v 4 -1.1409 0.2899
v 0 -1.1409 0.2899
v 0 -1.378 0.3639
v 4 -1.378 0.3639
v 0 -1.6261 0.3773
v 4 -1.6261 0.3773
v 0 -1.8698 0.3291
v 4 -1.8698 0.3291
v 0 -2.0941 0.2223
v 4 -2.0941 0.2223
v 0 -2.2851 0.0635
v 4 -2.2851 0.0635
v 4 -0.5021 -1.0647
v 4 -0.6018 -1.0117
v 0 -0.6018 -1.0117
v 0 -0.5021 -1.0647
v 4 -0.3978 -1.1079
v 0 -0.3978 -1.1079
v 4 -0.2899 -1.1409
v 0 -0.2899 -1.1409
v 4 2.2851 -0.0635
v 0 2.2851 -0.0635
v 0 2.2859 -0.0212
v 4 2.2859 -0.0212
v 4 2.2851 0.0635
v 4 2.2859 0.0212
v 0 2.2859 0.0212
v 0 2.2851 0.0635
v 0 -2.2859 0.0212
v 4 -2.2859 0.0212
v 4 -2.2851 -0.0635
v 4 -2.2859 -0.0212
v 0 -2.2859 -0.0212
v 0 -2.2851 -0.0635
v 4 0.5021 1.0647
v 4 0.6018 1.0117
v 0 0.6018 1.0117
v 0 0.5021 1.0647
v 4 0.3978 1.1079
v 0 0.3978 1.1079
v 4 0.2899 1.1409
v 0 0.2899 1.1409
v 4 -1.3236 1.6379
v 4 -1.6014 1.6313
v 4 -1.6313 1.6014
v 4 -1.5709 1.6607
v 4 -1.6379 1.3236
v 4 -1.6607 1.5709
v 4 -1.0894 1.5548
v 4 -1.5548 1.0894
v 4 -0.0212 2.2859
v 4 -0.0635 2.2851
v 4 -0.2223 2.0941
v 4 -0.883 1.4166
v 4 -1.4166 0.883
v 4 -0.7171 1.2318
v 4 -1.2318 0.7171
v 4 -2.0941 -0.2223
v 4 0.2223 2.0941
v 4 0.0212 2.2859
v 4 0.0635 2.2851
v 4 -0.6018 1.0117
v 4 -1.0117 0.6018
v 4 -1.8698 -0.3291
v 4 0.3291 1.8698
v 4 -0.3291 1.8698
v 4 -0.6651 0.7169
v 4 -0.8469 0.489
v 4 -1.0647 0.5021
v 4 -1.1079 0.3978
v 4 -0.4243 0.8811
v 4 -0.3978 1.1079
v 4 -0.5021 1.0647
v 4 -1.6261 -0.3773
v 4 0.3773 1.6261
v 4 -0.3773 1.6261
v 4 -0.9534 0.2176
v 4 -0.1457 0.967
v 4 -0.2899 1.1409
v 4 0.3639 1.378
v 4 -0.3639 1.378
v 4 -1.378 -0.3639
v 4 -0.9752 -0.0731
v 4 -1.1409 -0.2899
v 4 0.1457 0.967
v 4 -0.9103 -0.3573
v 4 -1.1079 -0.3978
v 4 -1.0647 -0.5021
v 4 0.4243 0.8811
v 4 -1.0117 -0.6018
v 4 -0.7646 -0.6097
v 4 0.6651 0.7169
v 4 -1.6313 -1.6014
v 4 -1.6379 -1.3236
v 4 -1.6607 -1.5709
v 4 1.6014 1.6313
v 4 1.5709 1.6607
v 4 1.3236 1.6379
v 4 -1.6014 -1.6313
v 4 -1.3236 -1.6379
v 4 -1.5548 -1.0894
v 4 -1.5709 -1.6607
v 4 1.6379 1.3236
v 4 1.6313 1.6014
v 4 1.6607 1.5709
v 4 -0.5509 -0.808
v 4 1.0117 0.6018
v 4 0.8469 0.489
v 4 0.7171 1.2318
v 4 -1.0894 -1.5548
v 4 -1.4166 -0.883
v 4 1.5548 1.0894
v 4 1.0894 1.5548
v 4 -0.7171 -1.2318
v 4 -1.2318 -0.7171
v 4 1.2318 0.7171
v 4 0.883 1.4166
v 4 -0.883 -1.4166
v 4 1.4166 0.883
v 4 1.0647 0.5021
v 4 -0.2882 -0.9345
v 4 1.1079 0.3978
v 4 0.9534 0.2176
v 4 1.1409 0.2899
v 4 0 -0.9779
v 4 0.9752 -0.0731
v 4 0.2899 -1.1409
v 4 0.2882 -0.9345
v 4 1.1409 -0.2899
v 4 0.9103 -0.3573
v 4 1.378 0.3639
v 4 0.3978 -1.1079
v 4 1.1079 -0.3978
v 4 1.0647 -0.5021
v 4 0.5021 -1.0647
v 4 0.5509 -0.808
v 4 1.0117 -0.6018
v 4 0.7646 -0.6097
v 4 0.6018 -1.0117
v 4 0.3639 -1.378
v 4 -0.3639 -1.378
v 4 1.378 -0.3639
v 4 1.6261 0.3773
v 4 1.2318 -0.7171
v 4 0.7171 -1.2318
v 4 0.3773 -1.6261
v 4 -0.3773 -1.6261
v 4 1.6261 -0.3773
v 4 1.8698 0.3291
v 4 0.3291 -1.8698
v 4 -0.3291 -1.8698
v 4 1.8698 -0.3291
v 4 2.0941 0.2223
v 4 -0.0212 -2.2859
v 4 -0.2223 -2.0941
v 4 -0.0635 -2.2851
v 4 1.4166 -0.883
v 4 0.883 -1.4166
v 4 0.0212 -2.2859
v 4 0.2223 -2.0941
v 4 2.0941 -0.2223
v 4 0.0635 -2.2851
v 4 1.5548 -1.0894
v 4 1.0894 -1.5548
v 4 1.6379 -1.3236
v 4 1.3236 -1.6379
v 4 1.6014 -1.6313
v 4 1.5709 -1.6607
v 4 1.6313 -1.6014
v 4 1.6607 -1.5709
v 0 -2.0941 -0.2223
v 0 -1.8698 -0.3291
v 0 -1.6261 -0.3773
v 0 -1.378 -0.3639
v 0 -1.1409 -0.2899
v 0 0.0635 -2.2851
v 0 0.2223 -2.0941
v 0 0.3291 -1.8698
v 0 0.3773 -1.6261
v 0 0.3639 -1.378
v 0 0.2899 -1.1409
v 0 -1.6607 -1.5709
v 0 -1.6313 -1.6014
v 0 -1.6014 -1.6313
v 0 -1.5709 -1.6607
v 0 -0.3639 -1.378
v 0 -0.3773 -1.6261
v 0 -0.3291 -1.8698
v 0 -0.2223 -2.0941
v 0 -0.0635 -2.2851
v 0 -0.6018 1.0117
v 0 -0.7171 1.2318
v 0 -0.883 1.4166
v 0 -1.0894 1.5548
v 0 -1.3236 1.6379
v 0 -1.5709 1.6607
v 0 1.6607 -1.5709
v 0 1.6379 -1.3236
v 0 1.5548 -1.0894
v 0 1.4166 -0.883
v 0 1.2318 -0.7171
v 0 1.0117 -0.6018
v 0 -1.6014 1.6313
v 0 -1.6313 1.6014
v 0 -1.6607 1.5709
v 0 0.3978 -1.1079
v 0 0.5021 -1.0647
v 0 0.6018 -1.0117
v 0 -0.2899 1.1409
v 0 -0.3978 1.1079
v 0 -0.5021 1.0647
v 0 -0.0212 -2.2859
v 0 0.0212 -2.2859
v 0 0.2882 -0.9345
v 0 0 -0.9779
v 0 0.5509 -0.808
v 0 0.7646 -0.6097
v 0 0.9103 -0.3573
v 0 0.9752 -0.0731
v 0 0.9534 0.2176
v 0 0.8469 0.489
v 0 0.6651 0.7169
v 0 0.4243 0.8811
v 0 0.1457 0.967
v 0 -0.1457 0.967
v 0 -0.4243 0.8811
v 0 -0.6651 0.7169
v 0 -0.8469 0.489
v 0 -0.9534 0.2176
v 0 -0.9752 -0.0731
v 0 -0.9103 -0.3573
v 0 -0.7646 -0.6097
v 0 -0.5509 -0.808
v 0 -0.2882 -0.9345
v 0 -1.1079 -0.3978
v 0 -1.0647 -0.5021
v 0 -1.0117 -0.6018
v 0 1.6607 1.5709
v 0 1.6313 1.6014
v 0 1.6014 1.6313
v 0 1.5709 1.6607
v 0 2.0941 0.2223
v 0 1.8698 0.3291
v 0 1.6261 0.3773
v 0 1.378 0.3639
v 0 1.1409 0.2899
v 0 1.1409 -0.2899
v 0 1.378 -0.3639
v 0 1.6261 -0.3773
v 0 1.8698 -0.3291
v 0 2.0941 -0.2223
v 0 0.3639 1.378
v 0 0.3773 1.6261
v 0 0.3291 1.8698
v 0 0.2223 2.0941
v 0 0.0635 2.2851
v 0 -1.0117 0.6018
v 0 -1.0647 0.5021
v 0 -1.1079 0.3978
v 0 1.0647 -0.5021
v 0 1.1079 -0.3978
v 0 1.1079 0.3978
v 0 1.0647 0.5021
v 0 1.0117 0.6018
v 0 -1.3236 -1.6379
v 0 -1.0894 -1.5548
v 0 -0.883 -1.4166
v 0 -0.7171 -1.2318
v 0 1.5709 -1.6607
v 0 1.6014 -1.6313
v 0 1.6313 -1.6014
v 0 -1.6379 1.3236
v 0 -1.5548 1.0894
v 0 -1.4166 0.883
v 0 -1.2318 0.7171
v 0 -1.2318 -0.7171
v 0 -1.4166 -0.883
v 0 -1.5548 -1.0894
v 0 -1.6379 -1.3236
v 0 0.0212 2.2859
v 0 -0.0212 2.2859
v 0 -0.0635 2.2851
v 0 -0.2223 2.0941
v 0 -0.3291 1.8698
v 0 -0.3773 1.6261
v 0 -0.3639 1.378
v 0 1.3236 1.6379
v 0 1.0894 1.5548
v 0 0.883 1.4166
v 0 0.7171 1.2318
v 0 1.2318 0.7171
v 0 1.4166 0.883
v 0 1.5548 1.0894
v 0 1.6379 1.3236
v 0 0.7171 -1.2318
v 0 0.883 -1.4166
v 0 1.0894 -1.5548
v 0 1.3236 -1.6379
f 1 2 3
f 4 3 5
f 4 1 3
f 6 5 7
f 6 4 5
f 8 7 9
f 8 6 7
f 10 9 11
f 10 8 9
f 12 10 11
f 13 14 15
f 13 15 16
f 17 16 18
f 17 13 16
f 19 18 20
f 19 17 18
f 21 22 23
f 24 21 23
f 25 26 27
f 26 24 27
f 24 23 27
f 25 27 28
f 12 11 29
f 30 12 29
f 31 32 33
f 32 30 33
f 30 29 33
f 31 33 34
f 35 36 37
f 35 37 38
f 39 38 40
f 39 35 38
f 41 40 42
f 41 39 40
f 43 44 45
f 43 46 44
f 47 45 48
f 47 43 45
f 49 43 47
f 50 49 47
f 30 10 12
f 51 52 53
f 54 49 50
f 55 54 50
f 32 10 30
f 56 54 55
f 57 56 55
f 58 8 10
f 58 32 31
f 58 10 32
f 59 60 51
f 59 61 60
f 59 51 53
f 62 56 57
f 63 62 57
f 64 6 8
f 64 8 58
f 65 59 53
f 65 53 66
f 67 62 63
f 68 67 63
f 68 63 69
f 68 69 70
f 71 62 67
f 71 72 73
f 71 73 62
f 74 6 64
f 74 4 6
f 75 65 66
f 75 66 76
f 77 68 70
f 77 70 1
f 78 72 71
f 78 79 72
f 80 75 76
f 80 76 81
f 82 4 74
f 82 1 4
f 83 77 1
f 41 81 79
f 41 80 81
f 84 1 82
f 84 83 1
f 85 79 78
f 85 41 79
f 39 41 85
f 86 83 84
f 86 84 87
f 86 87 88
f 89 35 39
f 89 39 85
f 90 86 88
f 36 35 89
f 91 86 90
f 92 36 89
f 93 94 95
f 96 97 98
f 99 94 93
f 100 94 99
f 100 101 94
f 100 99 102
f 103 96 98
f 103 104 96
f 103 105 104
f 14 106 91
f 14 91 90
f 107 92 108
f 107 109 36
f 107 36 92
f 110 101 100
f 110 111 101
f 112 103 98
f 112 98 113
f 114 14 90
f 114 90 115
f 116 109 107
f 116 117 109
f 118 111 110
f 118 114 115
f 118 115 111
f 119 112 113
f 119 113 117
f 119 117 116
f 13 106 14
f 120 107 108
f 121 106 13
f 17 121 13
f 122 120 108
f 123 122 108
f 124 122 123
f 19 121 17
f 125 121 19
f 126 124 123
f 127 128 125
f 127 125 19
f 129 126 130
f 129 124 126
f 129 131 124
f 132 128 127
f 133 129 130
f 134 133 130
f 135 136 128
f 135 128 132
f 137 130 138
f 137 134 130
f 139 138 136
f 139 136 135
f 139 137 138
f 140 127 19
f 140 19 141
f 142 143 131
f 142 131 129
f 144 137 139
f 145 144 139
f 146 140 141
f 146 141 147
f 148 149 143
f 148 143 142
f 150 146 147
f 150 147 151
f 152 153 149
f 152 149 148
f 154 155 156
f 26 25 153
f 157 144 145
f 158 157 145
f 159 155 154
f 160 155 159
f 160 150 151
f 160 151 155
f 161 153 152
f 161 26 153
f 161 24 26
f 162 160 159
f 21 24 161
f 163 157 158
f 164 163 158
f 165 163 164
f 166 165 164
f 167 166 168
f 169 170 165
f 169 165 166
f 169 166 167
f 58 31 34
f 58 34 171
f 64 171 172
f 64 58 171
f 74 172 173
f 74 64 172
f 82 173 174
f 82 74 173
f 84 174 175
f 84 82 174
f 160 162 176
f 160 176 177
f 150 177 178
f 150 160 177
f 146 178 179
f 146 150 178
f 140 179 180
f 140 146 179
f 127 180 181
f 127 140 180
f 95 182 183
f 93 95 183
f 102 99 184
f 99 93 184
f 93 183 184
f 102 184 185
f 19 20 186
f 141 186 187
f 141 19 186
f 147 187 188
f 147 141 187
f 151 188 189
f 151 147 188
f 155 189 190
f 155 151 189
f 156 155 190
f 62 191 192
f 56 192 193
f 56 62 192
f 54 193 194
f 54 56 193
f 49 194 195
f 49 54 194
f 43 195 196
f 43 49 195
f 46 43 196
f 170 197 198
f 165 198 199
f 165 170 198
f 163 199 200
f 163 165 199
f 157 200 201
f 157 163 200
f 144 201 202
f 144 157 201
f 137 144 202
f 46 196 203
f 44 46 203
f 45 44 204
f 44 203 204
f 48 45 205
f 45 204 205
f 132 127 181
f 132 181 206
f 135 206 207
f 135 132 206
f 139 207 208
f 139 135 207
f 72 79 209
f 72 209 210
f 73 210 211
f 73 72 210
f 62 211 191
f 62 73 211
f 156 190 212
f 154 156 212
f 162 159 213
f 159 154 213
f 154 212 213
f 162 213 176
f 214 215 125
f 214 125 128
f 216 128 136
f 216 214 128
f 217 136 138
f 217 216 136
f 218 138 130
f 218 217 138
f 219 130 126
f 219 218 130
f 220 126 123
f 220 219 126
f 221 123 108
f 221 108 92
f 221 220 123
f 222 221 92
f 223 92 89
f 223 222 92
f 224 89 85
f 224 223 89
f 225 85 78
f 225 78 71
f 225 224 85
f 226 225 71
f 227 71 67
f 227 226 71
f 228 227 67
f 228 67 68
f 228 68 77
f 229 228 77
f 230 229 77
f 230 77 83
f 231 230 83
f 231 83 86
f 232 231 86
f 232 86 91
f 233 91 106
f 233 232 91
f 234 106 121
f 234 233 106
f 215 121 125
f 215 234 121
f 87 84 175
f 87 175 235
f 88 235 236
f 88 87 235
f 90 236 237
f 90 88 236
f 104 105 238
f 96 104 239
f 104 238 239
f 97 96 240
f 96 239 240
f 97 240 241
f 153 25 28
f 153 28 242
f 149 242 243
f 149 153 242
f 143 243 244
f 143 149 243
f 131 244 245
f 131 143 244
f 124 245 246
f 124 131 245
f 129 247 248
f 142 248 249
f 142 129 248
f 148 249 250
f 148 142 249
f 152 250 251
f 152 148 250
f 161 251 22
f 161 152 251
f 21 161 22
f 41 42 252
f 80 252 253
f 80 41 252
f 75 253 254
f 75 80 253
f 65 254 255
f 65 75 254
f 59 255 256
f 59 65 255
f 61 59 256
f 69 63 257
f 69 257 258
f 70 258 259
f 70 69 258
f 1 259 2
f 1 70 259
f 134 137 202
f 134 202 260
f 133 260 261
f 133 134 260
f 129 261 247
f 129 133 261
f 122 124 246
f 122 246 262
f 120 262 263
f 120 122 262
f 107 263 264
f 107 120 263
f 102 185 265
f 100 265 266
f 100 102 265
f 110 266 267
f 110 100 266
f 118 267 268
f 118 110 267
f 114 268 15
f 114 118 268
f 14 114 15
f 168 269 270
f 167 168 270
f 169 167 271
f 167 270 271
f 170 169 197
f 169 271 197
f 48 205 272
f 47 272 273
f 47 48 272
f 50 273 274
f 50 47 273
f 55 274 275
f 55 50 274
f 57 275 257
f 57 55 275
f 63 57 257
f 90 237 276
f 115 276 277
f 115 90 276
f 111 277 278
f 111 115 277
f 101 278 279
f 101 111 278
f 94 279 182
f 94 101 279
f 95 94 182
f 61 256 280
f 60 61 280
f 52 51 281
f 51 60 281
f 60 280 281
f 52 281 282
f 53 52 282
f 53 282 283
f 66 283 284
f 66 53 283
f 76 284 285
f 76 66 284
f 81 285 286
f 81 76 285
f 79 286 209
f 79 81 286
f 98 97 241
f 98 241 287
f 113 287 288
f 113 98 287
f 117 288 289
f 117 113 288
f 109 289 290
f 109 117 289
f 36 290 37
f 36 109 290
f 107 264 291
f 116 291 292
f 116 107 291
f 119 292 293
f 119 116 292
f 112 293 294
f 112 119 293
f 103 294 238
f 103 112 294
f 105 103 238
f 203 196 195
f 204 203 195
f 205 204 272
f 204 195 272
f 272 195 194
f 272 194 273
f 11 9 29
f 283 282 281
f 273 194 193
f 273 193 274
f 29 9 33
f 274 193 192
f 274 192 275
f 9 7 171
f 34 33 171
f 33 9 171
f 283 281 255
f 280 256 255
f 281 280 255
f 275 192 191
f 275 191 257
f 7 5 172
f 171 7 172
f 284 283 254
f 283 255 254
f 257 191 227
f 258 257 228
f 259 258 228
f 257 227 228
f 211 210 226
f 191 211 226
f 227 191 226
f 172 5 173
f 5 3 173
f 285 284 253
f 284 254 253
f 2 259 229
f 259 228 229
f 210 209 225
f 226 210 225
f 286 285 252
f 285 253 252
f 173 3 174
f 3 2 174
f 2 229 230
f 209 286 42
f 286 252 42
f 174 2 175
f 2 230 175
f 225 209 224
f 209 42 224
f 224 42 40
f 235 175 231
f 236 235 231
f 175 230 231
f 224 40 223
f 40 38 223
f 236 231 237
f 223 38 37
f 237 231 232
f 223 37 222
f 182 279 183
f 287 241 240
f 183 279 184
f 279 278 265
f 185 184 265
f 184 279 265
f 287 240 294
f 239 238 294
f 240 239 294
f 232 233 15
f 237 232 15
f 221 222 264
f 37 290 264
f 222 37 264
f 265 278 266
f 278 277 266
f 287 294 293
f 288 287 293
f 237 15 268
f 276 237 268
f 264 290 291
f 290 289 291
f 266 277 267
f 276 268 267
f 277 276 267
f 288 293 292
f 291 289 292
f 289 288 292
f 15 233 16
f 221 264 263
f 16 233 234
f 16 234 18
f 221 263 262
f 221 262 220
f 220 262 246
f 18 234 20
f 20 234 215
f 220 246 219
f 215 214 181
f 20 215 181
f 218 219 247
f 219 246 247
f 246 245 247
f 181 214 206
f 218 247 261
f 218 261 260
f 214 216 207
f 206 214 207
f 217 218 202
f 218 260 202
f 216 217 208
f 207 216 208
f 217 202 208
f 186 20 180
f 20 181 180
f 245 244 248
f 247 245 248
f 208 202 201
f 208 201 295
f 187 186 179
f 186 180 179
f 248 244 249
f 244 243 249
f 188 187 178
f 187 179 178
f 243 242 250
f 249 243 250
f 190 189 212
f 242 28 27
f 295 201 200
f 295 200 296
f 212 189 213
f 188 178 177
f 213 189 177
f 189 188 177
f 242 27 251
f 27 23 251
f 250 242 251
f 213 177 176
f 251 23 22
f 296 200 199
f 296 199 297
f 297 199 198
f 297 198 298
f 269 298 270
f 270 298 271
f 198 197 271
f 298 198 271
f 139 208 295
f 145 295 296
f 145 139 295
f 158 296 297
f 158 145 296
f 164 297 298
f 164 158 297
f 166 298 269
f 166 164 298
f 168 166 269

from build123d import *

# Parameters (mm, degrees)
SKETCH1_R           = 2.286
SKETCH1_R_2         = 0.9779
BOSS_EXTRUDE1_DEPTH = 4
CUT_EXTRUDE1_DEPTH  = 5
CIRPATTERN1_COUNT   = 8


with BuildPart() as part:
    # Sketch1 → Boss-Extrude1 (new body)
    with BuildSketch(Plane(origin=(0, 0, 0), x_dir=(0, 0, -1), z_dir=(1, 0, 0))):
        Circle(SKETCH1_R)
        Circle(SKETCH1_R_2, mode=Mode.SUBTRACT)
    extrude(amount=BOSS_EXTRUDE1_DEPTH)

    # Sketch2 → Cut-Extrude1 (cut, through all)
    with BuildSketch(Plane(origin=(4, 0, 0), x_dir=(0, 0, -1), z_dir=(1, 0, 0))):
        with BuildLine():
            ThreePointArc((-1.140932588, 0.28986551), (-1.825366269, 0.342648296), (-2.382567636, -0.058303225))
            ThreePointArc((-2.382567636, -0.058303225), (-2.201864435, 0.912042112), (-1.643503126, 1.725956338))
            ThreePointArc((-1.643503126, 1.725956338), (-1.5330178, 1.048439933), (-1.011727037, 0.601795302))
            ThreePointArc((-1.011727037, 0.601795302), (-1.087571108, 0.450486703), (-1.140932588, 0.28986551))
        make_face()
    cut_extrude1 = extrude(amount=-CUT_EXTRUDE1_DEPTH, mode=Mode.SUBTRACT)

    # CirPattern1: Cut-Extrude1 ×8 about axis
    cirpattern1_axis = Axis((0, 0, 0), (1, 0, 0))
    for i in range(1, CIRPATTERN1_COUNT):
        add(cut_extrude1.rotate(cirpattern1_axis, i * 360 / CIRPATTERN1_COUNT), mode=Mode.SUBTRACT)


solid = part.part
